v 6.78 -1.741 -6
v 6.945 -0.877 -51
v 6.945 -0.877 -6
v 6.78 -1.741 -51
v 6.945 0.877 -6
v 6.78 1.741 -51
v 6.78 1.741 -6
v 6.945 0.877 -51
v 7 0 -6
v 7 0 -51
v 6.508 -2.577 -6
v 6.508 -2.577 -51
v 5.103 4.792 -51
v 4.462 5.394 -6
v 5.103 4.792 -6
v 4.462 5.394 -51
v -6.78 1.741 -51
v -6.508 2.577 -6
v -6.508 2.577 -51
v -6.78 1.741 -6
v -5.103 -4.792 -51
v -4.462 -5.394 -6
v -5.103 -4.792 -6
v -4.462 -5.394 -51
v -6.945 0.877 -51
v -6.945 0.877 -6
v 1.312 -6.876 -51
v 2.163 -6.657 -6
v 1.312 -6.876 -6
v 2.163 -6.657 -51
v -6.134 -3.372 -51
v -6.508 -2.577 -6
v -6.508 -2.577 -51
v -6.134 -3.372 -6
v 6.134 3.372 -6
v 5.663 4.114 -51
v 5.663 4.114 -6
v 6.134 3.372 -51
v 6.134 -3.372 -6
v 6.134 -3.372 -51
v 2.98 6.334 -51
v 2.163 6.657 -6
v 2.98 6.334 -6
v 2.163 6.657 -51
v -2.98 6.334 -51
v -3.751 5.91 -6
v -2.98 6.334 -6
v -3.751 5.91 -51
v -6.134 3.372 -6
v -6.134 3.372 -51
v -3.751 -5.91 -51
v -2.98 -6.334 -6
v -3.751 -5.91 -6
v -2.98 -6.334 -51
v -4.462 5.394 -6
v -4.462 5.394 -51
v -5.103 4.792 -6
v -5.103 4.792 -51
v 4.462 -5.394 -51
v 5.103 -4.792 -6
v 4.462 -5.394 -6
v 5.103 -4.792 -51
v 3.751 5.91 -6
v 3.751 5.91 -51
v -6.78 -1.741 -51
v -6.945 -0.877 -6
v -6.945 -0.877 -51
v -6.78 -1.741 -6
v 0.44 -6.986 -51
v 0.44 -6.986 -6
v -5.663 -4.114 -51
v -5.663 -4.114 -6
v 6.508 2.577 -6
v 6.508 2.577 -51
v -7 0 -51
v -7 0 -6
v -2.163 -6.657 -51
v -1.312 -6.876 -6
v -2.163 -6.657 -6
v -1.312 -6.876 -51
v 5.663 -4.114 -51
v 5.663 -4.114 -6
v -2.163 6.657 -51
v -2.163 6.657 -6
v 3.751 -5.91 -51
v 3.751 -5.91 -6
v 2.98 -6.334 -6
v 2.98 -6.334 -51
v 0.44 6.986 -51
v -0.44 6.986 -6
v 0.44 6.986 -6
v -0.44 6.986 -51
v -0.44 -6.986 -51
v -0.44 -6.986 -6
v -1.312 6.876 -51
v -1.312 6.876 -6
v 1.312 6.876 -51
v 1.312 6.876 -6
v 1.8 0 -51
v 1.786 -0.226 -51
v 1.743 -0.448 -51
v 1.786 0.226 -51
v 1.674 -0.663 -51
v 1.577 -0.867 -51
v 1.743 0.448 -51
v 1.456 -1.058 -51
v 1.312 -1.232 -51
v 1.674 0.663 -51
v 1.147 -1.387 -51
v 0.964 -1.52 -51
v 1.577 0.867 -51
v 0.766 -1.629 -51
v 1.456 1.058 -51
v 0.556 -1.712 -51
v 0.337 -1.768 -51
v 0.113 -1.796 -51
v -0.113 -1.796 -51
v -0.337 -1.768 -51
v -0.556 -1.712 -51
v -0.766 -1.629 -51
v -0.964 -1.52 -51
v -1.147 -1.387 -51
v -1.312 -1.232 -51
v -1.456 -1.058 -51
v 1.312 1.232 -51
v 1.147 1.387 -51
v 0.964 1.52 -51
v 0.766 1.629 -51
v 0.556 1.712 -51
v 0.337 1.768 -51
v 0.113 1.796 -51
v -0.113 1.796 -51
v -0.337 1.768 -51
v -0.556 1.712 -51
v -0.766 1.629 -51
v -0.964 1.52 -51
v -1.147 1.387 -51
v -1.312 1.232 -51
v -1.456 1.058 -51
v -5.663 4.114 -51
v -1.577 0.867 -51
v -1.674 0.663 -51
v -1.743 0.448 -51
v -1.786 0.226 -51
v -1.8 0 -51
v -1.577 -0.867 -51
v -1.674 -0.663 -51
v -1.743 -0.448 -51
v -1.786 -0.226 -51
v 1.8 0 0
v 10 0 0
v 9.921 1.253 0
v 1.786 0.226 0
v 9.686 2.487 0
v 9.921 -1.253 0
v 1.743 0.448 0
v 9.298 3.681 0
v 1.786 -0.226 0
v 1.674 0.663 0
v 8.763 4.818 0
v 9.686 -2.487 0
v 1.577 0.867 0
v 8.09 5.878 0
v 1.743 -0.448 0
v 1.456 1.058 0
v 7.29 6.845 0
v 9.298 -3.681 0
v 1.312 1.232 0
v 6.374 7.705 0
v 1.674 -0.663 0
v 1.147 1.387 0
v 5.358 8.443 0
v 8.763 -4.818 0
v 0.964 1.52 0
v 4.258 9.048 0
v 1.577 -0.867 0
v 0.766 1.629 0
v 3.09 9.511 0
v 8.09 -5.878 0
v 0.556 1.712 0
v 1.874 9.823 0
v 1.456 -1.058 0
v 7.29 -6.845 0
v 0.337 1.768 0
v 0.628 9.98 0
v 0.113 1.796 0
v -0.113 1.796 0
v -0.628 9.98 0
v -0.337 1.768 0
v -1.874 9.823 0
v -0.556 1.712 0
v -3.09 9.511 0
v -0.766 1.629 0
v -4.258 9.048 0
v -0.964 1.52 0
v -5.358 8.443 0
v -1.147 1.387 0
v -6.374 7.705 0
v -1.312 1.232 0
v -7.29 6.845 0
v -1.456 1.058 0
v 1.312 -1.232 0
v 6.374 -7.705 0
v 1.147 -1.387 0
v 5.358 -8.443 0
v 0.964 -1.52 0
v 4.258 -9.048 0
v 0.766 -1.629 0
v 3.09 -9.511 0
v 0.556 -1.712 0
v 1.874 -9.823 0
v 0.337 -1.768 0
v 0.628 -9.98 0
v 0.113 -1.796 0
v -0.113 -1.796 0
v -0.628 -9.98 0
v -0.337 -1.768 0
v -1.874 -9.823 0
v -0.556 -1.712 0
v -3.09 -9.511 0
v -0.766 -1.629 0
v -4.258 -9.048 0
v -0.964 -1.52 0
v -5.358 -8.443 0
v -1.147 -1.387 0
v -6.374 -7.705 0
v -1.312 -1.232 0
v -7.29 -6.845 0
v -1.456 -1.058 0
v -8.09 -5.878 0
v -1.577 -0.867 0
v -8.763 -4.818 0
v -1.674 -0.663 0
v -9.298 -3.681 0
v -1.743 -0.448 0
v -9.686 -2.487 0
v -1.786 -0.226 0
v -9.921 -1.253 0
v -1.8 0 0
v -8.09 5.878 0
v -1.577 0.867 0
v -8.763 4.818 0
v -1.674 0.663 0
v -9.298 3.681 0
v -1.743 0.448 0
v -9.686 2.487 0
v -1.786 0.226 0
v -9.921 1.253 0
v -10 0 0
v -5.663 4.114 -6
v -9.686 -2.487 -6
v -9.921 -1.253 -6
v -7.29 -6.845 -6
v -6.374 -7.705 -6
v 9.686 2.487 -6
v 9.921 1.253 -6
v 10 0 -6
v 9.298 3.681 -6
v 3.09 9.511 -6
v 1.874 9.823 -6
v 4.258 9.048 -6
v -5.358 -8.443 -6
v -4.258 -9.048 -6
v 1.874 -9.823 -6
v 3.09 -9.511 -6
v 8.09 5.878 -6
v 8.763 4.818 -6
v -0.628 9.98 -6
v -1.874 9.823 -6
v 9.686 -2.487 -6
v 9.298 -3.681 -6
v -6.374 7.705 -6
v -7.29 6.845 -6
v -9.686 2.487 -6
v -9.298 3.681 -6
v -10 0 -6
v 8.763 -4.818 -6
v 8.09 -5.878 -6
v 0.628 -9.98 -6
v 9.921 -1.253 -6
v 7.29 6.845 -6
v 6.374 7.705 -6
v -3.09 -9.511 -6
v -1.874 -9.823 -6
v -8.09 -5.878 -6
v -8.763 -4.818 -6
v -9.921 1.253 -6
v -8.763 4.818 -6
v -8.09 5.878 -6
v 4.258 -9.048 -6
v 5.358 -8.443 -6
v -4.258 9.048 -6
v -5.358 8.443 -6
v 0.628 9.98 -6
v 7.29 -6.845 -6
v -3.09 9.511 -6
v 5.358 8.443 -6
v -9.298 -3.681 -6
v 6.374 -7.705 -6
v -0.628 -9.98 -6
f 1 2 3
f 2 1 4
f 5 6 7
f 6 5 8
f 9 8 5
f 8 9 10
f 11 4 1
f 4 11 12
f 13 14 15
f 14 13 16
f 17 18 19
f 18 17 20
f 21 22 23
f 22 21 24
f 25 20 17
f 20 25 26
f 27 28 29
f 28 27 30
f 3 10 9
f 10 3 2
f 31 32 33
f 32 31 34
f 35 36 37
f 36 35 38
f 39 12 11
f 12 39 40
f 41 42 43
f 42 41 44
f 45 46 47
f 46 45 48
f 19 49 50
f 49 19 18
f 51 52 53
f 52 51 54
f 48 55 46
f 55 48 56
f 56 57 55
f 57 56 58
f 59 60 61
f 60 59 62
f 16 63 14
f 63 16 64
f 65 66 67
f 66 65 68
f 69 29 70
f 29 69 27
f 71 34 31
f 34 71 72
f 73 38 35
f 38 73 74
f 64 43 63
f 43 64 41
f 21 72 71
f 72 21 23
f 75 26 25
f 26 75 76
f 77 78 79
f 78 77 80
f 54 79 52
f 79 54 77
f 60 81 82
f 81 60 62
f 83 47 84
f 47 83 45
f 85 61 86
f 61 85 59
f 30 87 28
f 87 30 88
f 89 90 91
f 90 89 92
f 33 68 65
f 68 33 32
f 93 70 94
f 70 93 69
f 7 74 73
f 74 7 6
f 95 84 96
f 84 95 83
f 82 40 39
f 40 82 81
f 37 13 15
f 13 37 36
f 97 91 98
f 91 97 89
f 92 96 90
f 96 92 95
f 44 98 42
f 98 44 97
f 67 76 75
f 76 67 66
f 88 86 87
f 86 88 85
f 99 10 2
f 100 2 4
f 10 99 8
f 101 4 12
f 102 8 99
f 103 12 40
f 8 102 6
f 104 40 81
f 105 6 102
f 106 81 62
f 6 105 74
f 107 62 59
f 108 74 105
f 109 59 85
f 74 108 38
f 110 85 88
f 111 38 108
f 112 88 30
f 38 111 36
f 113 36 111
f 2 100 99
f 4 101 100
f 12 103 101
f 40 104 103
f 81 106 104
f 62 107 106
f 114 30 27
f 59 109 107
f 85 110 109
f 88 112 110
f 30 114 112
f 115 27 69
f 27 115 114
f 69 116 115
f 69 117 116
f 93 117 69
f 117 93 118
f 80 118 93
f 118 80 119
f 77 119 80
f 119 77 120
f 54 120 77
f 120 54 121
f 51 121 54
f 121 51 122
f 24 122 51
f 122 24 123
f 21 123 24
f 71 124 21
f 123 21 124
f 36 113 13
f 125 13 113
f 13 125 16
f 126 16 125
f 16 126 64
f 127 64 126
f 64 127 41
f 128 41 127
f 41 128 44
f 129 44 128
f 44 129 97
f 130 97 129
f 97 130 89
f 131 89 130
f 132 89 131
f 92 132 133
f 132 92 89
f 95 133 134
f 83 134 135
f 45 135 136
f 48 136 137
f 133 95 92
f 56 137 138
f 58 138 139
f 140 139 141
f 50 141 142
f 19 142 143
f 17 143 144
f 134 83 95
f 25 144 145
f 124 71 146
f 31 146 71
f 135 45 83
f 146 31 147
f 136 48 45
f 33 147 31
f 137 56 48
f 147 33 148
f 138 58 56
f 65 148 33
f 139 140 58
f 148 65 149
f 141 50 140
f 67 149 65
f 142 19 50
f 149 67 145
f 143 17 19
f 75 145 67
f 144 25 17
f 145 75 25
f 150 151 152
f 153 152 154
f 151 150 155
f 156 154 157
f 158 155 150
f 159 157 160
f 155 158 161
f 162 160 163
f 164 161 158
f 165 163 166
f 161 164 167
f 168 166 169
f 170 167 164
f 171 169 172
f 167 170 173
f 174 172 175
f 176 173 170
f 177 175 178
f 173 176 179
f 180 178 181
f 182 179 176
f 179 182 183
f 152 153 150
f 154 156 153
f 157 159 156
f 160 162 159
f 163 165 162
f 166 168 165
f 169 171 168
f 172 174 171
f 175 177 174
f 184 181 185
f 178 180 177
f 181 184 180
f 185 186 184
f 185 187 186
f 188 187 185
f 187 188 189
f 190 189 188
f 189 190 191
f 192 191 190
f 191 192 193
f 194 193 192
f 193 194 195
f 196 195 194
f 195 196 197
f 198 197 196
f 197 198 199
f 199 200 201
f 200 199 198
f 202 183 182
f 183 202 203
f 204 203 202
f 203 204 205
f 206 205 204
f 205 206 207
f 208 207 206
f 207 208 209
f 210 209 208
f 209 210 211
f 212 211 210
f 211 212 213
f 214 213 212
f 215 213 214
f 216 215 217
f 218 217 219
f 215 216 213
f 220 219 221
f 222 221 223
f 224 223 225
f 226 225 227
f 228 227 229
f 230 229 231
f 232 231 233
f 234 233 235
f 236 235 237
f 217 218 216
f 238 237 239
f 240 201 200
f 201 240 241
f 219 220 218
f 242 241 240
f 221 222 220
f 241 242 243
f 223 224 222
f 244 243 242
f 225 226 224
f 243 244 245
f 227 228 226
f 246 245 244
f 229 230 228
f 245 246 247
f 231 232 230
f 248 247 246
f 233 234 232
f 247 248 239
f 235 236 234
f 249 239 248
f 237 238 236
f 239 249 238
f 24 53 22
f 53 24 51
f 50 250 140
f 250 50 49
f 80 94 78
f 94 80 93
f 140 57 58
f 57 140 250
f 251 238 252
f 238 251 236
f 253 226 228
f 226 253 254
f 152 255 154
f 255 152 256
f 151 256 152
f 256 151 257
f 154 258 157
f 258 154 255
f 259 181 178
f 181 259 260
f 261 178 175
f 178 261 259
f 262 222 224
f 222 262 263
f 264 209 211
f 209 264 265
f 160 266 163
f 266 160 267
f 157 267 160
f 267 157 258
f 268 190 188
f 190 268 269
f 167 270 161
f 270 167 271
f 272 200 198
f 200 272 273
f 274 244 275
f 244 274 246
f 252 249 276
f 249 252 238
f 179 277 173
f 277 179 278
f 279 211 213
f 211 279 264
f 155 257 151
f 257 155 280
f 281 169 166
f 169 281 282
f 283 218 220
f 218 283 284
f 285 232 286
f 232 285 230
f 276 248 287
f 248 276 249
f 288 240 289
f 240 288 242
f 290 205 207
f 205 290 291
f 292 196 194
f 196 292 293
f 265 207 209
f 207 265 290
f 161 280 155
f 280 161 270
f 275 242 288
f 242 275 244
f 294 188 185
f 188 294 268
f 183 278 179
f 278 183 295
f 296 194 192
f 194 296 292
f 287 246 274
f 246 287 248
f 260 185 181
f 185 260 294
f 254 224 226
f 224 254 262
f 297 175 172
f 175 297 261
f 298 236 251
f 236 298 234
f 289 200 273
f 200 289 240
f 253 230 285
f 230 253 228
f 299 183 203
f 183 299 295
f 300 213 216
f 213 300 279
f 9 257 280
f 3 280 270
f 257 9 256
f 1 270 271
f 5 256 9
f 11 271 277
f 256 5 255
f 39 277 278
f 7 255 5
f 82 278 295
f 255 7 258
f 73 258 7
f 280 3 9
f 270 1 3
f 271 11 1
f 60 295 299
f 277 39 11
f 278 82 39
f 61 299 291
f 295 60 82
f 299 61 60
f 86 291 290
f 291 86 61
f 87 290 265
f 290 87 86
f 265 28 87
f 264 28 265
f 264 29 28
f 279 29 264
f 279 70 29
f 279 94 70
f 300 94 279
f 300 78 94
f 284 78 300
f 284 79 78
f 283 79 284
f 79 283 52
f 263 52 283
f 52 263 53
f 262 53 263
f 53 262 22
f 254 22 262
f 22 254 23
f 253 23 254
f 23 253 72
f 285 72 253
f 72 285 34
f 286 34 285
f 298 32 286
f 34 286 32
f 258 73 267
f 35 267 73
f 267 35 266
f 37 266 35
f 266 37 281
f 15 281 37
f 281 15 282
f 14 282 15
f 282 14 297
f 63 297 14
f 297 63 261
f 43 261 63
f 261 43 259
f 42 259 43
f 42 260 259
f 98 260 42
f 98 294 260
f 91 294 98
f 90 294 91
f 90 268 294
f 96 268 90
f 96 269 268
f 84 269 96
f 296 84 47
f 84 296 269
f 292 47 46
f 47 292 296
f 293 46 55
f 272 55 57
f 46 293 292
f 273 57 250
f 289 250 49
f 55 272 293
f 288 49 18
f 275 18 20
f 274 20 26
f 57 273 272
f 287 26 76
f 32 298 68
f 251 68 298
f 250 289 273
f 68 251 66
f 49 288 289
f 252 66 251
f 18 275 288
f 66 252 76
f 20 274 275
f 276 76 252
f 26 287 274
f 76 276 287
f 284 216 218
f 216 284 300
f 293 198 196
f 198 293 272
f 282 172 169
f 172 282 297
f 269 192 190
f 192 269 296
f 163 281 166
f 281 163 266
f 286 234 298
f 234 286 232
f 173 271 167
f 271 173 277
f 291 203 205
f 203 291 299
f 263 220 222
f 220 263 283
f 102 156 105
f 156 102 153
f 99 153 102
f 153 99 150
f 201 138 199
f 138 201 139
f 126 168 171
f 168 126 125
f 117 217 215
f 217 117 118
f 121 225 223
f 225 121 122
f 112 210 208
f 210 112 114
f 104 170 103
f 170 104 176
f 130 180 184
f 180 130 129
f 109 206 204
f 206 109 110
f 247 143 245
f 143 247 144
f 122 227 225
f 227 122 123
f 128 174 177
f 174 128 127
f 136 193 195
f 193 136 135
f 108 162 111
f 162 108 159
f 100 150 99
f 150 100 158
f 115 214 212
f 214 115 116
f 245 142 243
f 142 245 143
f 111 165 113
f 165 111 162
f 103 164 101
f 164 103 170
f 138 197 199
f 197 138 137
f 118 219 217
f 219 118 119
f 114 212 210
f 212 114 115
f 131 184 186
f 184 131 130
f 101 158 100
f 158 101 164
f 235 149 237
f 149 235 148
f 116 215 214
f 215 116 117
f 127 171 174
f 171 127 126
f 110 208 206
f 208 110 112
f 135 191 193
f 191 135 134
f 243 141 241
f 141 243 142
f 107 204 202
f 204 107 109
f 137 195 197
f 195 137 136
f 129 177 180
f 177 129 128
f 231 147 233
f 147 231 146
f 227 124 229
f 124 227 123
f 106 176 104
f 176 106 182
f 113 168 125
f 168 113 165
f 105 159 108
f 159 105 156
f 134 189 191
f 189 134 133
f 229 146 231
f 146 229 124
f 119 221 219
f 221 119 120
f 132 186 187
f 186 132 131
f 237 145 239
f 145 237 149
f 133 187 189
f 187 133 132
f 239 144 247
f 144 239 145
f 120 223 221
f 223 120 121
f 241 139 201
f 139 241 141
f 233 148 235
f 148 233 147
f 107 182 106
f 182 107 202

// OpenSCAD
$fn = 50;


difference() {
	union() {
		translate(v = [0, 0, -51.0000000000]) {
			cylinder(h = 51, r = 7.0000000000);
		}
		translate(v = [0, 0, -6.0000000000]) {
			cylinder(h = 6, r = 10.0000000000);
		}
	}
	union() {
		#translate(v = [0, 0, -51]) {
			cylinder(h = 51, r = 1.8000000000);
		}
	}
}
